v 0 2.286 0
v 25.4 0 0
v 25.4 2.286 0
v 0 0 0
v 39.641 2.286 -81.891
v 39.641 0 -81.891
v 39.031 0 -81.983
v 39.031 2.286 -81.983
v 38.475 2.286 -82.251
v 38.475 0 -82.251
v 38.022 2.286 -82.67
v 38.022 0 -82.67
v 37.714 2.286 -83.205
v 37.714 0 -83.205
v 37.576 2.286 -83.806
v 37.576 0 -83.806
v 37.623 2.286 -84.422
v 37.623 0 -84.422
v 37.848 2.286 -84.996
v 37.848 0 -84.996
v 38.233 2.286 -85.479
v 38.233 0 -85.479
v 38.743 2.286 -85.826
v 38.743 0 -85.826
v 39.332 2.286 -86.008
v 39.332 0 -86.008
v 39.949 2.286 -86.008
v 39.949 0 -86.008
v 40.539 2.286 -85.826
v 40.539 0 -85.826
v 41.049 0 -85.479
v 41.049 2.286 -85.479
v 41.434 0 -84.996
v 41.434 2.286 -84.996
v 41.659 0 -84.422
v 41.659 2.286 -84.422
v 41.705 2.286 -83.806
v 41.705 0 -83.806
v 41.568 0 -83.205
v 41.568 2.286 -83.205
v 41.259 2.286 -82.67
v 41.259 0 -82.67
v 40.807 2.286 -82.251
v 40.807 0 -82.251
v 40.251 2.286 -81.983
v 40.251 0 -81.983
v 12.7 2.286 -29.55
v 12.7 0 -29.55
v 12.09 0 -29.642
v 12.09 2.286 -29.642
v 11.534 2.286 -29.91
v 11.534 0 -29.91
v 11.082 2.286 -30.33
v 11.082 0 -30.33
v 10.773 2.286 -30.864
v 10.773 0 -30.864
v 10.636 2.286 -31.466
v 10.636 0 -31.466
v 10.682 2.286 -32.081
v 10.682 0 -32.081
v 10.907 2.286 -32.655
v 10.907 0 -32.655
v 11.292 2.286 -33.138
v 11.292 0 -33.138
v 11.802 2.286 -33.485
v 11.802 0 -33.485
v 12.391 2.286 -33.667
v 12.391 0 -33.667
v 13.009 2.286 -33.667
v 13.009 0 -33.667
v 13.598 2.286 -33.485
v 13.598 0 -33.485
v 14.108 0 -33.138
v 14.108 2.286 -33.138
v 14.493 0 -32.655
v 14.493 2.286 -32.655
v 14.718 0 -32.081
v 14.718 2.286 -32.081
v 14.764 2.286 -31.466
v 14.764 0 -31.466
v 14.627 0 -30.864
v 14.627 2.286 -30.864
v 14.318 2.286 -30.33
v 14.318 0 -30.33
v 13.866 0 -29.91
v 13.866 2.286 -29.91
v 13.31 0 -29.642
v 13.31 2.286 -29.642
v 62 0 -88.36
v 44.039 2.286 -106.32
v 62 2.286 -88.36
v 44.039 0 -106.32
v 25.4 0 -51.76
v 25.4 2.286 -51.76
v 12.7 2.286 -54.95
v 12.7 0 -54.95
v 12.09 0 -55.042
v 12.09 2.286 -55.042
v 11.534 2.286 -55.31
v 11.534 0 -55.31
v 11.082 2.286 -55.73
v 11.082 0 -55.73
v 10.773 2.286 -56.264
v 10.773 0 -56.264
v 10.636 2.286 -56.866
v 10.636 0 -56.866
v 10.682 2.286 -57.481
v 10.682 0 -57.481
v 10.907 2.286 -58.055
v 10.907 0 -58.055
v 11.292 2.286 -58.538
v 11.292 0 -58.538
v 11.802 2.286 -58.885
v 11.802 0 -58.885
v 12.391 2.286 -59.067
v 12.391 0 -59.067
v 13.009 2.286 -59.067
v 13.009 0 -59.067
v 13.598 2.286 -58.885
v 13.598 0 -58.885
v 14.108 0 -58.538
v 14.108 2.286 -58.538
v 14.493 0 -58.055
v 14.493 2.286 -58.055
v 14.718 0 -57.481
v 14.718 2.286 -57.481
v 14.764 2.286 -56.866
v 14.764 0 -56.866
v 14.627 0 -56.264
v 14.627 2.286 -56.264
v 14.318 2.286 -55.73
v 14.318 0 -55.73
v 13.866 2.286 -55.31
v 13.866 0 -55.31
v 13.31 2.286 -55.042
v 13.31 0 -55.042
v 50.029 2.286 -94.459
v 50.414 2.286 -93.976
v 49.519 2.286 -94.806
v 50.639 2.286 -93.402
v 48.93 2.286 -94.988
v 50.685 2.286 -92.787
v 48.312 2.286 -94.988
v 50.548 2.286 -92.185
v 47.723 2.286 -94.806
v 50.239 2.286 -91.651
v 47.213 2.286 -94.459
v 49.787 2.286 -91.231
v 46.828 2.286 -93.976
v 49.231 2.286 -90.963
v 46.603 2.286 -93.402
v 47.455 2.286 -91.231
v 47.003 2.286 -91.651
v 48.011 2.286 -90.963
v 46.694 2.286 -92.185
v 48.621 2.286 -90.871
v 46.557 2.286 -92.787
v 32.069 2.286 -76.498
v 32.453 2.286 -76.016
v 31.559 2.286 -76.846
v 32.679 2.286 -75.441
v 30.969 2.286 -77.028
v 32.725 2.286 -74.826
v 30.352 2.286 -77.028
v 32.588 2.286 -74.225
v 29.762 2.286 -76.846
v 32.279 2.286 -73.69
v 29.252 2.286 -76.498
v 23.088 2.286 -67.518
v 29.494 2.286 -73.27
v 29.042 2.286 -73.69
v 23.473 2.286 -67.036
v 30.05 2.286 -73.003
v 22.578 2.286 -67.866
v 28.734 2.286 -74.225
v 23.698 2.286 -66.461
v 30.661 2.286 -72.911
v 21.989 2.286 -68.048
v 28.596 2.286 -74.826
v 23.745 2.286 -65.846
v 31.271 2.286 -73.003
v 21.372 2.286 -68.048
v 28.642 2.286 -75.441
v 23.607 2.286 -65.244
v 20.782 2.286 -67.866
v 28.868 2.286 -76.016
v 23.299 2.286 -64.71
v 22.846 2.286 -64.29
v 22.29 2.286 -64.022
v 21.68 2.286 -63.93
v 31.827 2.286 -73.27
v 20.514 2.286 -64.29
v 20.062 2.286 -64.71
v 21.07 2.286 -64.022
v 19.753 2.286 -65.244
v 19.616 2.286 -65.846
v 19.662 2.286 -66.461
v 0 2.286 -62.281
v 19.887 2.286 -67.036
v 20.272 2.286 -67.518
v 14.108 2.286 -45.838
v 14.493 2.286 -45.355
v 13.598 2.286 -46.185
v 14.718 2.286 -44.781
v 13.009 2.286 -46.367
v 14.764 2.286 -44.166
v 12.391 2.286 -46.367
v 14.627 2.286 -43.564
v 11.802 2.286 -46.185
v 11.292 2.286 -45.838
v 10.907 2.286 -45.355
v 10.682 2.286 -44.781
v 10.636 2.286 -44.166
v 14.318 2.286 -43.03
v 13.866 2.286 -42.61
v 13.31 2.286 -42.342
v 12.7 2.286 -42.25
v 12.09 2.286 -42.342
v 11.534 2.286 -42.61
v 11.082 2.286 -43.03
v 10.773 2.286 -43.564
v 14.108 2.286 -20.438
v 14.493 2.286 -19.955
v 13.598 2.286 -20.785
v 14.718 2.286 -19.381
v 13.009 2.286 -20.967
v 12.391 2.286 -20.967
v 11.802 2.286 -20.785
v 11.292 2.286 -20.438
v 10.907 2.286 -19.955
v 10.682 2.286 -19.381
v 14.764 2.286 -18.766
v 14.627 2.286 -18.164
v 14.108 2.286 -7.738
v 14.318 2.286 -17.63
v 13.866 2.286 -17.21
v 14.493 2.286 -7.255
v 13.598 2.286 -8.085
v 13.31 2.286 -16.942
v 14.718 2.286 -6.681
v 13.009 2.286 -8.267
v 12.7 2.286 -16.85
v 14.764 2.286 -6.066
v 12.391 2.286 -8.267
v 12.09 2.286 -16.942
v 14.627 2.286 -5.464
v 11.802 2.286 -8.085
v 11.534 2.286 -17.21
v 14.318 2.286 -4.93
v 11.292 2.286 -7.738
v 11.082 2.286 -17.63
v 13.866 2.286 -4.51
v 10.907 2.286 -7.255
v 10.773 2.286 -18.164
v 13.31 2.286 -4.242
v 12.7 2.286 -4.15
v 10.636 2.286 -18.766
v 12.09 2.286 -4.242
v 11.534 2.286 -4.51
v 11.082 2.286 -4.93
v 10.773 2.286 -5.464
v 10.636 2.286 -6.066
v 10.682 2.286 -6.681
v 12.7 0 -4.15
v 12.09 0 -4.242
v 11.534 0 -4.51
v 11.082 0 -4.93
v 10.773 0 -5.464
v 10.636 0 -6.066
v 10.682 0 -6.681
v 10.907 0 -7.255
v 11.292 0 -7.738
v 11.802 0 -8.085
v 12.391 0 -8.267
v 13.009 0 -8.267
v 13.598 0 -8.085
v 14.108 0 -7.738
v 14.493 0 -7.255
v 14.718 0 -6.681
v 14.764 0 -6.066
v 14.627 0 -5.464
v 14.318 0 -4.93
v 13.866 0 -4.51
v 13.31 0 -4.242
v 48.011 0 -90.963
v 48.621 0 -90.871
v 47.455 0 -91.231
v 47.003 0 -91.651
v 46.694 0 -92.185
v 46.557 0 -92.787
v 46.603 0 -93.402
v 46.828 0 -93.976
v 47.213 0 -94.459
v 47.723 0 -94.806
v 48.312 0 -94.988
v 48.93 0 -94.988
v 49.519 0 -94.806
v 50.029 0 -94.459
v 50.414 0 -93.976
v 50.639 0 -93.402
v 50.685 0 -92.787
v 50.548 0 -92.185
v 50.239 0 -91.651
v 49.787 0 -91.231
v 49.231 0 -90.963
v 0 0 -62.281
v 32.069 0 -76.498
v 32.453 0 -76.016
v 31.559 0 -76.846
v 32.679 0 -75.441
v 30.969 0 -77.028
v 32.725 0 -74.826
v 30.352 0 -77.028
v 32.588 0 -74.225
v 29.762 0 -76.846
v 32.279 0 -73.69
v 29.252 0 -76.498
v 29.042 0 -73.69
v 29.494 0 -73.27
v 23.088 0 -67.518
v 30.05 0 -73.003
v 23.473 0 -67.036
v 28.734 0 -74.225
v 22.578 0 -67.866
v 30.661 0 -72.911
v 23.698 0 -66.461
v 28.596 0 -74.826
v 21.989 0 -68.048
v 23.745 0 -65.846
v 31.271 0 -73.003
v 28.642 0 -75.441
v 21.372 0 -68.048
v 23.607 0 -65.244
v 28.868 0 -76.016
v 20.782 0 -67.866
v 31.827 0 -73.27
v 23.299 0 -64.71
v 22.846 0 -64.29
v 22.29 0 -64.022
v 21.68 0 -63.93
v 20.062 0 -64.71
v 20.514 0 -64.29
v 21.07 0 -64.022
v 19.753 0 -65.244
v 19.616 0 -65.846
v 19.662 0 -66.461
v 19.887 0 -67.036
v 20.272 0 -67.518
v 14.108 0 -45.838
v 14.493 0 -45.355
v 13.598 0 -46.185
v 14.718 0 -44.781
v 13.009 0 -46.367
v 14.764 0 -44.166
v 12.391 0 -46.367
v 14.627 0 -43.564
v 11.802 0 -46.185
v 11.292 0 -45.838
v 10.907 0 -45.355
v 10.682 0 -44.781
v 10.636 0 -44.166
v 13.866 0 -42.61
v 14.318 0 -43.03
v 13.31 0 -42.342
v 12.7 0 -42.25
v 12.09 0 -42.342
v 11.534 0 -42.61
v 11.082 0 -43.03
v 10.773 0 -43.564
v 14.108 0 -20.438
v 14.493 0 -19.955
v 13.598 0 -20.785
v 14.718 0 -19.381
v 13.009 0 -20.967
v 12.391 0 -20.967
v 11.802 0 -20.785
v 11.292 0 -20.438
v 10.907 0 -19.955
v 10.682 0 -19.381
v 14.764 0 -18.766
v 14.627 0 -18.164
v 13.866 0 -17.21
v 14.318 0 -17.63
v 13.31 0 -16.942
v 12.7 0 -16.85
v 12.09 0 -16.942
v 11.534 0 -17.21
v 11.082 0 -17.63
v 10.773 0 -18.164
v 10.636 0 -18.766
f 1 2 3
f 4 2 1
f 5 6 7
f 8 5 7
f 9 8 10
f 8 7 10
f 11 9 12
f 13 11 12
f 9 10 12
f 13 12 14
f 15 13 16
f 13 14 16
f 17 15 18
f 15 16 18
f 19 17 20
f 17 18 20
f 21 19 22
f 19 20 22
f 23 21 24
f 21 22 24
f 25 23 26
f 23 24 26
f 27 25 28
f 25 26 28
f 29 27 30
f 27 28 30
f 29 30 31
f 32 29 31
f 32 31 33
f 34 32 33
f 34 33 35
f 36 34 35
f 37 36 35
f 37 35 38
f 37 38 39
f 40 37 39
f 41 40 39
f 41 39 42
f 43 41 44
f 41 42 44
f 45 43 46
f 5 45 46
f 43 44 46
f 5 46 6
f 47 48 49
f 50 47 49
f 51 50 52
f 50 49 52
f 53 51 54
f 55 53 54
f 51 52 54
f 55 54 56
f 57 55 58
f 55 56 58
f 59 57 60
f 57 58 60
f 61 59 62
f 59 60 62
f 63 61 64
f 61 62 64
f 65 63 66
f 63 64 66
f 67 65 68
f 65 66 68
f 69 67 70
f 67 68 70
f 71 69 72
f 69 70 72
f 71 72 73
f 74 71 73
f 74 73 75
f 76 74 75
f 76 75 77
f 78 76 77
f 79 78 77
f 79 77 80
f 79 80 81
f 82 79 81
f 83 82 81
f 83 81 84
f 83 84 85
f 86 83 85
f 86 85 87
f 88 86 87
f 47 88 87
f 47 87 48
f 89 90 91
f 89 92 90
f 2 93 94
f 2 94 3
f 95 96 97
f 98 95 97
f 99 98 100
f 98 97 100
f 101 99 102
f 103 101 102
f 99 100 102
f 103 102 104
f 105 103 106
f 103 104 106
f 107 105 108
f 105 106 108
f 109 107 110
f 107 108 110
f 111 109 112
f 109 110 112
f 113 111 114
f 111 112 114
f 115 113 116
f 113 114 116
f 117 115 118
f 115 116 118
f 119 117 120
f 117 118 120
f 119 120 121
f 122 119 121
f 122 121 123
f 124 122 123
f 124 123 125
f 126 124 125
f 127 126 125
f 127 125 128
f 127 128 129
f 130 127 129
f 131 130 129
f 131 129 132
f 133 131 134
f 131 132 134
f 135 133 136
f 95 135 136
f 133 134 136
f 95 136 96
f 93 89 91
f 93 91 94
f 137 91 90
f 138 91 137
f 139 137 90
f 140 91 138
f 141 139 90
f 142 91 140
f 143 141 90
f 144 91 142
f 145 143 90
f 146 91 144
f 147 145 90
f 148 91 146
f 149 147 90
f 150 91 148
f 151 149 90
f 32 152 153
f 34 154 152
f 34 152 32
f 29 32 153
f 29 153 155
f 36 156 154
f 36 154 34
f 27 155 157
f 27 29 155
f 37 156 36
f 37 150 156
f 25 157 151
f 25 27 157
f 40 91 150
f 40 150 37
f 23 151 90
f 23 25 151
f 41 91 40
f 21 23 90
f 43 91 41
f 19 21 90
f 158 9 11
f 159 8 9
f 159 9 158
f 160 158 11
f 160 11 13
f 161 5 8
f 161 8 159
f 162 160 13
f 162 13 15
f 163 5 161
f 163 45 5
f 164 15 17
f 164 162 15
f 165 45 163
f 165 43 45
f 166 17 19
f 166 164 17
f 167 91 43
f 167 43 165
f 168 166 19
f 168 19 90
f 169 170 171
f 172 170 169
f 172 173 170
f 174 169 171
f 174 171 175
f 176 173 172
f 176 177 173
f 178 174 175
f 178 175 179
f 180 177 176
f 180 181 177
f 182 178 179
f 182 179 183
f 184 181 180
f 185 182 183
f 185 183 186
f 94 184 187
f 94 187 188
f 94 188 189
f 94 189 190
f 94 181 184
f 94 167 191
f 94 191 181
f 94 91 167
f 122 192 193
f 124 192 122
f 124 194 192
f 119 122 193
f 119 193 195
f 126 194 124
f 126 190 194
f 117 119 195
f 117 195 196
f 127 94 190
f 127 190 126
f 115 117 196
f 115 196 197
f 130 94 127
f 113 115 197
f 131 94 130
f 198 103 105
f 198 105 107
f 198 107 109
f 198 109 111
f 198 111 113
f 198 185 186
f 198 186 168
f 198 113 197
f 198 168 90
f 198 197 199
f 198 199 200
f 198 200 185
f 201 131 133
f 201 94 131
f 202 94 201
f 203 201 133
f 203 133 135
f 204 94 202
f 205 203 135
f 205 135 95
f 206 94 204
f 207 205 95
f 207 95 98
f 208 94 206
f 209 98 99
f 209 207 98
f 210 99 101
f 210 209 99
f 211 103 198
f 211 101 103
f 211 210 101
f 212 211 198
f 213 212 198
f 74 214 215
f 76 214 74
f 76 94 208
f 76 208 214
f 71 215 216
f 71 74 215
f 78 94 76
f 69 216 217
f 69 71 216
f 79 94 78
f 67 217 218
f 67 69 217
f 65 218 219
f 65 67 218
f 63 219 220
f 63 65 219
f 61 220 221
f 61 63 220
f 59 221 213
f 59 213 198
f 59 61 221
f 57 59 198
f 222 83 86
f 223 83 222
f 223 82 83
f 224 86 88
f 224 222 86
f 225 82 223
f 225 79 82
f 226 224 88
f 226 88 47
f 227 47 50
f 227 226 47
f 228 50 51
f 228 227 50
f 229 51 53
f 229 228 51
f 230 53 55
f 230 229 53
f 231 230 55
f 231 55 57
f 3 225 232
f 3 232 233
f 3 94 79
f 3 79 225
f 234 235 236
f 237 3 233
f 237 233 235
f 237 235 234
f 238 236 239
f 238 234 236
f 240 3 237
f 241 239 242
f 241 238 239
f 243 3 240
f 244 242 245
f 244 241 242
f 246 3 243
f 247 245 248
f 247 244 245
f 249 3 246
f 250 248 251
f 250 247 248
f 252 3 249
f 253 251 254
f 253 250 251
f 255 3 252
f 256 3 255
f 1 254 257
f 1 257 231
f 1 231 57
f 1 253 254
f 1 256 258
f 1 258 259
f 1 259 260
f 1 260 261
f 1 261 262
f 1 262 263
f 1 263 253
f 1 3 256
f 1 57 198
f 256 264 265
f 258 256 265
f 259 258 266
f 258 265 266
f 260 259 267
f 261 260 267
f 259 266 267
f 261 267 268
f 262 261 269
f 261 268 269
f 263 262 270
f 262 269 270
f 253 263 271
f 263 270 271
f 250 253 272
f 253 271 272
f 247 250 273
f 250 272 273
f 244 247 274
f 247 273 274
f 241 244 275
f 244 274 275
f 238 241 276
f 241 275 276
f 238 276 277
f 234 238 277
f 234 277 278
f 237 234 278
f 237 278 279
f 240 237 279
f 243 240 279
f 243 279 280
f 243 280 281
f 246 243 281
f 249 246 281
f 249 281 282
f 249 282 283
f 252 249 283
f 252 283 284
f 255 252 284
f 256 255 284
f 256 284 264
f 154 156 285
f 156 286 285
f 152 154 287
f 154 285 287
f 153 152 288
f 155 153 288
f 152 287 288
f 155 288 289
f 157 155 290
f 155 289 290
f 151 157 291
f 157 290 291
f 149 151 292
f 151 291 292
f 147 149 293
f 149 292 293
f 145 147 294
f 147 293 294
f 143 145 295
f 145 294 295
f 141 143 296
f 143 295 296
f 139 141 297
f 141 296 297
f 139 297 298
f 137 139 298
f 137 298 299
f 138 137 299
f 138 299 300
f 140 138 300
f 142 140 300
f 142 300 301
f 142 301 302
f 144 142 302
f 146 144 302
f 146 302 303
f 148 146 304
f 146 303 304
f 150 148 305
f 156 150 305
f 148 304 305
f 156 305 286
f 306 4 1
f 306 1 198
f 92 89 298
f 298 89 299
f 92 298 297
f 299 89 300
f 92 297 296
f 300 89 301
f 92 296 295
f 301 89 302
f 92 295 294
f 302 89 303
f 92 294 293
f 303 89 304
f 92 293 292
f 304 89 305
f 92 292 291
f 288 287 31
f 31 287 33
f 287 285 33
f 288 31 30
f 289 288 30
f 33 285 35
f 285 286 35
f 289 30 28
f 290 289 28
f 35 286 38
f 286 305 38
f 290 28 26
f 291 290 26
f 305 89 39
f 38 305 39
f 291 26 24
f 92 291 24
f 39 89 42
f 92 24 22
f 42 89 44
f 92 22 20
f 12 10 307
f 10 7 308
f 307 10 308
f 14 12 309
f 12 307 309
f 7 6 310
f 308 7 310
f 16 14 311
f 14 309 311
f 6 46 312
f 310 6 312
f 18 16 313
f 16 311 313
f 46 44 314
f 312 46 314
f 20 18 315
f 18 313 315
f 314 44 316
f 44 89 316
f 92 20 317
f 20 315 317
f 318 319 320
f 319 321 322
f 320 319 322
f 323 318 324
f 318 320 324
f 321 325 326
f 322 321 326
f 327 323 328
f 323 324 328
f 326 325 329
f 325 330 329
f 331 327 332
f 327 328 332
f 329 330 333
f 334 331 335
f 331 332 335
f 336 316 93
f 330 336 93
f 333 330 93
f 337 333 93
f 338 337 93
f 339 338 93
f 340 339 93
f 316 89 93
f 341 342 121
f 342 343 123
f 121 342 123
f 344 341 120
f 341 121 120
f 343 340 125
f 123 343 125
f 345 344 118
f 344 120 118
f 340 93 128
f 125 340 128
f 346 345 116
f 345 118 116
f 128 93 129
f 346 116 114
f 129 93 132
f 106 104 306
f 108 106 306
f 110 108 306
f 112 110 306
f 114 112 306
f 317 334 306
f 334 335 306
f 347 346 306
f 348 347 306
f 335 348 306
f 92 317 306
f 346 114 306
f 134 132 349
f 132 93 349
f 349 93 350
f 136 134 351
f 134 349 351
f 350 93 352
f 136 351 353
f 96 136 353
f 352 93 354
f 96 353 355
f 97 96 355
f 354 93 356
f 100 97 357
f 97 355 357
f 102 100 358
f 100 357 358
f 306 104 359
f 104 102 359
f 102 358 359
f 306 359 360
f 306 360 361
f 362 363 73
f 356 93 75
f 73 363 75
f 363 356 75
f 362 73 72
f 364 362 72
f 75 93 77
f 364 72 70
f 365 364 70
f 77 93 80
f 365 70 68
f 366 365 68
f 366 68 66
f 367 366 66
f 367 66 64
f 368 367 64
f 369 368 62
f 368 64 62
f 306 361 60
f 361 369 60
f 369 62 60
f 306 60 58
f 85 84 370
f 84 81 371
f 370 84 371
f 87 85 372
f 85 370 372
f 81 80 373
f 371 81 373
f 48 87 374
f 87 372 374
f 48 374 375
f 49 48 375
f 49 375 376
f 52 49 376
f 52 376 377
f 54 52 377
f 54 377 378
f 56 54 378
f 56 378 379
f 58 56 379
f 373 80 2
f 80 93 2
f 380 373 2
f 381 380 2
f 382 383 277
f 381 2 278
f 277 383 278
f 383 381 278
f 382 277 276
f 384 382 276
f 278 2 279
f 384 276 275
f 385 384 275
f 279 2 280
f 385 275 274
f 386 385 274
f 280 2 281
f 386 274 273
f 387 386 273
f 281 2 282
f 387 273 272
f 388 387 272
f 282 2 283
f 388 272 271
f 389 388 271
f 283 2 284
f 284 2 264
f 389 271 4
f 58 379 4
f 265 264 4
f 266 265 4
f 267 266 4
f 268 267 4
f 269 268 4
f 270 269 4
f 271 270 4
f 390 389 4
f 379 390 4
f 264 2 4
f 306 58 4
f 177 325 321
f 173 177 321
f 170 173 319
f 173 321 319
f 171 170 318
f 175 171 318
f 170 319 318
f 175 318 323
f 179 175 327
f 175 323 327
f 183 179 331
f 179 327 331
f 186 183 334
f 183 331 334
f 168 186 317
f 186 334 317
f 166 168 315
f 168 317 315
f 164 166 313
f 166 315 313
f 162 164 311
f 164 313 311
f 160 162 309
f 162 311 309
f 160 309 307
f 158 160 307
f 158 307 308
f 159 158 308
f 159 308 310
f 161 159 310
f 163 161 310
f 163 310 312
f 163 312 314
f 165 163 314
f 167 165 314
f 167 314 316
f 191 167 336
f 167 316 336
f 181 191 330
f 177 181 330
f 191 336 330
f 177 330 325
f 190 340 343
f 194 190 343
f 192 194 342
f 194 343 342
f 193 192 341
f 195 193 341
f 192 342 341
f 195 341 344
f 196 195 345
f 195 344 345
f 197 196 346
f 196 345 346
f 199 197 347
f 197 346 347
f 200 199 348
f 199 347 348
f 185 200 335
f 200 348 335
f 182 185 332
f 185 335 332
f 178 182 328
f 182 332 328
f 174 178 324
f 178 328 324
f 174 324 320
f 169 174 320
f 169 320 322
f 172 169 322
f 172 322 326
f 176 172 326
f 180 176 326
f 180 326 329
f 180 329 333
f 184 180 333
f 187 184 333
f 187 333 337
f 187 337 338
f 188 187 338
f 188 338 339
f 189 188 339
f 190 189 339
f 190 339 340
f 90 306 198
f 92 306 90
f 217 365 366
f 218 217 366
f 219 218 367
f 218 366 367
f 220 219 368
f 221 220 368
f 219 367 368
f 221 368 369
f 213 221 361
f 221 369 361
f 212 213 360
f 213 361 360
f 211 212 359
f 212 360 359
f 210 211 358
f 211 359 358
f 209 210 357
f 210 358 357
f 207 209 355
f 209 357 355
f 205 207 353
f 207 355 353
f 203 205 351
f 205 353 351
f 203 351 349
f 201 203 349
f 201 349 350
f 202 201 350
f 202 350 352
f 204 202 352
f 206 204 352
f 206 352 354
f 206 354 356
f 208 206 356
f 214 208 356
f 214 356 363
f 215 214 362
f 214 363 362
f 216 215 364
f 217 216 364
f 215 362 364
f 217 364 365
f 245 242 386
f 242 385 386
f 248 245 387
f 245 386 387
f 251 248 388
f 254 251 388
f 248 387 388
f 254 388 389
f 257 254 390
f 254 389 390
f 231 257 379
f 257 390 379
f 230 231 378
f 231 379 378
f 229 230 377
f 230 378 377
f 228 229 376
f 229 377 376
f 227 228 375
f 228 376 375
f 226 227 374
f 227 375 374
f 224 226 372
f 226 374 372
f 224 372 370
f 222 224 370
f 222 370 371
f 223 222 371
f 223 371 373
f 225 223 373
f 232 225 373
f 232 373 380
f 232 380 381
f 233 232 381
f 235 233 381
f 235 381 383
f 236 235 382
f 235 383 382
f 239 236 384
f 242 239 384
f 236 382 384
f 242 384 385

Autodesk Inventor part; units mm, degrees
ref_plane "YZ Plane" through (0, 0, 0) normal (1, 0, 0) x (0, 1, 0)
ref_plane "XZ Plane" through (0, 0, 0) normal (0, 1, 0) x (-1, 0, 0)
ref_plane "XY Plane" through (0, 0, 0) normal (0, 0, 1) x (1, 0, 0)
sketch "Sketch1" plane through (0, 0, 0) normal (0, 1, 0) x (-1, 0, 0)
  line L0 (0, 0) -> (0, -62.2808)
  line L1 (0, -62.2808) -> (-44.0392, -106.32)
  line L2 (-44.0392, -106.32) -> (-61.9997, -88.3595)
  line L3 (-61.9997, -88.3595) -> (-25.4, -51.7598)
  line L4 (-25.4, -51.7598) -> (-25.4, 0)
  line L5 (-25.4, 0) -> (0, 0)
  line L6 (0, -62.2808) -> (-25.4, -51.7598) construction
  dimension "d0" = 62.2808
  dimension "d1" = 25.4
  dimension "d2" = 135
extrude "Extrusion1" add sketch "Sketch1" along normal blind 2.286
sketch "Sketch2" plane through (0, 2.286, 0) normal (0, 1, 0) x (1, 0, 0)
  line L0 (44.0392, 106.32) -> (0, 62.2808) projected
  line L1 (25.4, 0) -> (25.4, 51.7598) projected
  line L2 (0, 62.2808) -> (25.4, 51.7598) construction
  point P0 (0, 0)
  point P1 (12.7, 57.0203)
  dimension "d5" = 12.7
hole "Hole1" at (12.7, 2.286, -57.0203) direction (0, -1, 0) diameter 4.1402 end through all
pattern_linear "Rectangular Pattern1" count 5 spacing 12.7 along (0, 0, 1) of "Hole1"
pattern_linear "Rectangular Pattern2" count 5 spacing 12.7 along (0.7071, 0, -0.7071) of "Hole1"
properties part number "135 Gusset"
